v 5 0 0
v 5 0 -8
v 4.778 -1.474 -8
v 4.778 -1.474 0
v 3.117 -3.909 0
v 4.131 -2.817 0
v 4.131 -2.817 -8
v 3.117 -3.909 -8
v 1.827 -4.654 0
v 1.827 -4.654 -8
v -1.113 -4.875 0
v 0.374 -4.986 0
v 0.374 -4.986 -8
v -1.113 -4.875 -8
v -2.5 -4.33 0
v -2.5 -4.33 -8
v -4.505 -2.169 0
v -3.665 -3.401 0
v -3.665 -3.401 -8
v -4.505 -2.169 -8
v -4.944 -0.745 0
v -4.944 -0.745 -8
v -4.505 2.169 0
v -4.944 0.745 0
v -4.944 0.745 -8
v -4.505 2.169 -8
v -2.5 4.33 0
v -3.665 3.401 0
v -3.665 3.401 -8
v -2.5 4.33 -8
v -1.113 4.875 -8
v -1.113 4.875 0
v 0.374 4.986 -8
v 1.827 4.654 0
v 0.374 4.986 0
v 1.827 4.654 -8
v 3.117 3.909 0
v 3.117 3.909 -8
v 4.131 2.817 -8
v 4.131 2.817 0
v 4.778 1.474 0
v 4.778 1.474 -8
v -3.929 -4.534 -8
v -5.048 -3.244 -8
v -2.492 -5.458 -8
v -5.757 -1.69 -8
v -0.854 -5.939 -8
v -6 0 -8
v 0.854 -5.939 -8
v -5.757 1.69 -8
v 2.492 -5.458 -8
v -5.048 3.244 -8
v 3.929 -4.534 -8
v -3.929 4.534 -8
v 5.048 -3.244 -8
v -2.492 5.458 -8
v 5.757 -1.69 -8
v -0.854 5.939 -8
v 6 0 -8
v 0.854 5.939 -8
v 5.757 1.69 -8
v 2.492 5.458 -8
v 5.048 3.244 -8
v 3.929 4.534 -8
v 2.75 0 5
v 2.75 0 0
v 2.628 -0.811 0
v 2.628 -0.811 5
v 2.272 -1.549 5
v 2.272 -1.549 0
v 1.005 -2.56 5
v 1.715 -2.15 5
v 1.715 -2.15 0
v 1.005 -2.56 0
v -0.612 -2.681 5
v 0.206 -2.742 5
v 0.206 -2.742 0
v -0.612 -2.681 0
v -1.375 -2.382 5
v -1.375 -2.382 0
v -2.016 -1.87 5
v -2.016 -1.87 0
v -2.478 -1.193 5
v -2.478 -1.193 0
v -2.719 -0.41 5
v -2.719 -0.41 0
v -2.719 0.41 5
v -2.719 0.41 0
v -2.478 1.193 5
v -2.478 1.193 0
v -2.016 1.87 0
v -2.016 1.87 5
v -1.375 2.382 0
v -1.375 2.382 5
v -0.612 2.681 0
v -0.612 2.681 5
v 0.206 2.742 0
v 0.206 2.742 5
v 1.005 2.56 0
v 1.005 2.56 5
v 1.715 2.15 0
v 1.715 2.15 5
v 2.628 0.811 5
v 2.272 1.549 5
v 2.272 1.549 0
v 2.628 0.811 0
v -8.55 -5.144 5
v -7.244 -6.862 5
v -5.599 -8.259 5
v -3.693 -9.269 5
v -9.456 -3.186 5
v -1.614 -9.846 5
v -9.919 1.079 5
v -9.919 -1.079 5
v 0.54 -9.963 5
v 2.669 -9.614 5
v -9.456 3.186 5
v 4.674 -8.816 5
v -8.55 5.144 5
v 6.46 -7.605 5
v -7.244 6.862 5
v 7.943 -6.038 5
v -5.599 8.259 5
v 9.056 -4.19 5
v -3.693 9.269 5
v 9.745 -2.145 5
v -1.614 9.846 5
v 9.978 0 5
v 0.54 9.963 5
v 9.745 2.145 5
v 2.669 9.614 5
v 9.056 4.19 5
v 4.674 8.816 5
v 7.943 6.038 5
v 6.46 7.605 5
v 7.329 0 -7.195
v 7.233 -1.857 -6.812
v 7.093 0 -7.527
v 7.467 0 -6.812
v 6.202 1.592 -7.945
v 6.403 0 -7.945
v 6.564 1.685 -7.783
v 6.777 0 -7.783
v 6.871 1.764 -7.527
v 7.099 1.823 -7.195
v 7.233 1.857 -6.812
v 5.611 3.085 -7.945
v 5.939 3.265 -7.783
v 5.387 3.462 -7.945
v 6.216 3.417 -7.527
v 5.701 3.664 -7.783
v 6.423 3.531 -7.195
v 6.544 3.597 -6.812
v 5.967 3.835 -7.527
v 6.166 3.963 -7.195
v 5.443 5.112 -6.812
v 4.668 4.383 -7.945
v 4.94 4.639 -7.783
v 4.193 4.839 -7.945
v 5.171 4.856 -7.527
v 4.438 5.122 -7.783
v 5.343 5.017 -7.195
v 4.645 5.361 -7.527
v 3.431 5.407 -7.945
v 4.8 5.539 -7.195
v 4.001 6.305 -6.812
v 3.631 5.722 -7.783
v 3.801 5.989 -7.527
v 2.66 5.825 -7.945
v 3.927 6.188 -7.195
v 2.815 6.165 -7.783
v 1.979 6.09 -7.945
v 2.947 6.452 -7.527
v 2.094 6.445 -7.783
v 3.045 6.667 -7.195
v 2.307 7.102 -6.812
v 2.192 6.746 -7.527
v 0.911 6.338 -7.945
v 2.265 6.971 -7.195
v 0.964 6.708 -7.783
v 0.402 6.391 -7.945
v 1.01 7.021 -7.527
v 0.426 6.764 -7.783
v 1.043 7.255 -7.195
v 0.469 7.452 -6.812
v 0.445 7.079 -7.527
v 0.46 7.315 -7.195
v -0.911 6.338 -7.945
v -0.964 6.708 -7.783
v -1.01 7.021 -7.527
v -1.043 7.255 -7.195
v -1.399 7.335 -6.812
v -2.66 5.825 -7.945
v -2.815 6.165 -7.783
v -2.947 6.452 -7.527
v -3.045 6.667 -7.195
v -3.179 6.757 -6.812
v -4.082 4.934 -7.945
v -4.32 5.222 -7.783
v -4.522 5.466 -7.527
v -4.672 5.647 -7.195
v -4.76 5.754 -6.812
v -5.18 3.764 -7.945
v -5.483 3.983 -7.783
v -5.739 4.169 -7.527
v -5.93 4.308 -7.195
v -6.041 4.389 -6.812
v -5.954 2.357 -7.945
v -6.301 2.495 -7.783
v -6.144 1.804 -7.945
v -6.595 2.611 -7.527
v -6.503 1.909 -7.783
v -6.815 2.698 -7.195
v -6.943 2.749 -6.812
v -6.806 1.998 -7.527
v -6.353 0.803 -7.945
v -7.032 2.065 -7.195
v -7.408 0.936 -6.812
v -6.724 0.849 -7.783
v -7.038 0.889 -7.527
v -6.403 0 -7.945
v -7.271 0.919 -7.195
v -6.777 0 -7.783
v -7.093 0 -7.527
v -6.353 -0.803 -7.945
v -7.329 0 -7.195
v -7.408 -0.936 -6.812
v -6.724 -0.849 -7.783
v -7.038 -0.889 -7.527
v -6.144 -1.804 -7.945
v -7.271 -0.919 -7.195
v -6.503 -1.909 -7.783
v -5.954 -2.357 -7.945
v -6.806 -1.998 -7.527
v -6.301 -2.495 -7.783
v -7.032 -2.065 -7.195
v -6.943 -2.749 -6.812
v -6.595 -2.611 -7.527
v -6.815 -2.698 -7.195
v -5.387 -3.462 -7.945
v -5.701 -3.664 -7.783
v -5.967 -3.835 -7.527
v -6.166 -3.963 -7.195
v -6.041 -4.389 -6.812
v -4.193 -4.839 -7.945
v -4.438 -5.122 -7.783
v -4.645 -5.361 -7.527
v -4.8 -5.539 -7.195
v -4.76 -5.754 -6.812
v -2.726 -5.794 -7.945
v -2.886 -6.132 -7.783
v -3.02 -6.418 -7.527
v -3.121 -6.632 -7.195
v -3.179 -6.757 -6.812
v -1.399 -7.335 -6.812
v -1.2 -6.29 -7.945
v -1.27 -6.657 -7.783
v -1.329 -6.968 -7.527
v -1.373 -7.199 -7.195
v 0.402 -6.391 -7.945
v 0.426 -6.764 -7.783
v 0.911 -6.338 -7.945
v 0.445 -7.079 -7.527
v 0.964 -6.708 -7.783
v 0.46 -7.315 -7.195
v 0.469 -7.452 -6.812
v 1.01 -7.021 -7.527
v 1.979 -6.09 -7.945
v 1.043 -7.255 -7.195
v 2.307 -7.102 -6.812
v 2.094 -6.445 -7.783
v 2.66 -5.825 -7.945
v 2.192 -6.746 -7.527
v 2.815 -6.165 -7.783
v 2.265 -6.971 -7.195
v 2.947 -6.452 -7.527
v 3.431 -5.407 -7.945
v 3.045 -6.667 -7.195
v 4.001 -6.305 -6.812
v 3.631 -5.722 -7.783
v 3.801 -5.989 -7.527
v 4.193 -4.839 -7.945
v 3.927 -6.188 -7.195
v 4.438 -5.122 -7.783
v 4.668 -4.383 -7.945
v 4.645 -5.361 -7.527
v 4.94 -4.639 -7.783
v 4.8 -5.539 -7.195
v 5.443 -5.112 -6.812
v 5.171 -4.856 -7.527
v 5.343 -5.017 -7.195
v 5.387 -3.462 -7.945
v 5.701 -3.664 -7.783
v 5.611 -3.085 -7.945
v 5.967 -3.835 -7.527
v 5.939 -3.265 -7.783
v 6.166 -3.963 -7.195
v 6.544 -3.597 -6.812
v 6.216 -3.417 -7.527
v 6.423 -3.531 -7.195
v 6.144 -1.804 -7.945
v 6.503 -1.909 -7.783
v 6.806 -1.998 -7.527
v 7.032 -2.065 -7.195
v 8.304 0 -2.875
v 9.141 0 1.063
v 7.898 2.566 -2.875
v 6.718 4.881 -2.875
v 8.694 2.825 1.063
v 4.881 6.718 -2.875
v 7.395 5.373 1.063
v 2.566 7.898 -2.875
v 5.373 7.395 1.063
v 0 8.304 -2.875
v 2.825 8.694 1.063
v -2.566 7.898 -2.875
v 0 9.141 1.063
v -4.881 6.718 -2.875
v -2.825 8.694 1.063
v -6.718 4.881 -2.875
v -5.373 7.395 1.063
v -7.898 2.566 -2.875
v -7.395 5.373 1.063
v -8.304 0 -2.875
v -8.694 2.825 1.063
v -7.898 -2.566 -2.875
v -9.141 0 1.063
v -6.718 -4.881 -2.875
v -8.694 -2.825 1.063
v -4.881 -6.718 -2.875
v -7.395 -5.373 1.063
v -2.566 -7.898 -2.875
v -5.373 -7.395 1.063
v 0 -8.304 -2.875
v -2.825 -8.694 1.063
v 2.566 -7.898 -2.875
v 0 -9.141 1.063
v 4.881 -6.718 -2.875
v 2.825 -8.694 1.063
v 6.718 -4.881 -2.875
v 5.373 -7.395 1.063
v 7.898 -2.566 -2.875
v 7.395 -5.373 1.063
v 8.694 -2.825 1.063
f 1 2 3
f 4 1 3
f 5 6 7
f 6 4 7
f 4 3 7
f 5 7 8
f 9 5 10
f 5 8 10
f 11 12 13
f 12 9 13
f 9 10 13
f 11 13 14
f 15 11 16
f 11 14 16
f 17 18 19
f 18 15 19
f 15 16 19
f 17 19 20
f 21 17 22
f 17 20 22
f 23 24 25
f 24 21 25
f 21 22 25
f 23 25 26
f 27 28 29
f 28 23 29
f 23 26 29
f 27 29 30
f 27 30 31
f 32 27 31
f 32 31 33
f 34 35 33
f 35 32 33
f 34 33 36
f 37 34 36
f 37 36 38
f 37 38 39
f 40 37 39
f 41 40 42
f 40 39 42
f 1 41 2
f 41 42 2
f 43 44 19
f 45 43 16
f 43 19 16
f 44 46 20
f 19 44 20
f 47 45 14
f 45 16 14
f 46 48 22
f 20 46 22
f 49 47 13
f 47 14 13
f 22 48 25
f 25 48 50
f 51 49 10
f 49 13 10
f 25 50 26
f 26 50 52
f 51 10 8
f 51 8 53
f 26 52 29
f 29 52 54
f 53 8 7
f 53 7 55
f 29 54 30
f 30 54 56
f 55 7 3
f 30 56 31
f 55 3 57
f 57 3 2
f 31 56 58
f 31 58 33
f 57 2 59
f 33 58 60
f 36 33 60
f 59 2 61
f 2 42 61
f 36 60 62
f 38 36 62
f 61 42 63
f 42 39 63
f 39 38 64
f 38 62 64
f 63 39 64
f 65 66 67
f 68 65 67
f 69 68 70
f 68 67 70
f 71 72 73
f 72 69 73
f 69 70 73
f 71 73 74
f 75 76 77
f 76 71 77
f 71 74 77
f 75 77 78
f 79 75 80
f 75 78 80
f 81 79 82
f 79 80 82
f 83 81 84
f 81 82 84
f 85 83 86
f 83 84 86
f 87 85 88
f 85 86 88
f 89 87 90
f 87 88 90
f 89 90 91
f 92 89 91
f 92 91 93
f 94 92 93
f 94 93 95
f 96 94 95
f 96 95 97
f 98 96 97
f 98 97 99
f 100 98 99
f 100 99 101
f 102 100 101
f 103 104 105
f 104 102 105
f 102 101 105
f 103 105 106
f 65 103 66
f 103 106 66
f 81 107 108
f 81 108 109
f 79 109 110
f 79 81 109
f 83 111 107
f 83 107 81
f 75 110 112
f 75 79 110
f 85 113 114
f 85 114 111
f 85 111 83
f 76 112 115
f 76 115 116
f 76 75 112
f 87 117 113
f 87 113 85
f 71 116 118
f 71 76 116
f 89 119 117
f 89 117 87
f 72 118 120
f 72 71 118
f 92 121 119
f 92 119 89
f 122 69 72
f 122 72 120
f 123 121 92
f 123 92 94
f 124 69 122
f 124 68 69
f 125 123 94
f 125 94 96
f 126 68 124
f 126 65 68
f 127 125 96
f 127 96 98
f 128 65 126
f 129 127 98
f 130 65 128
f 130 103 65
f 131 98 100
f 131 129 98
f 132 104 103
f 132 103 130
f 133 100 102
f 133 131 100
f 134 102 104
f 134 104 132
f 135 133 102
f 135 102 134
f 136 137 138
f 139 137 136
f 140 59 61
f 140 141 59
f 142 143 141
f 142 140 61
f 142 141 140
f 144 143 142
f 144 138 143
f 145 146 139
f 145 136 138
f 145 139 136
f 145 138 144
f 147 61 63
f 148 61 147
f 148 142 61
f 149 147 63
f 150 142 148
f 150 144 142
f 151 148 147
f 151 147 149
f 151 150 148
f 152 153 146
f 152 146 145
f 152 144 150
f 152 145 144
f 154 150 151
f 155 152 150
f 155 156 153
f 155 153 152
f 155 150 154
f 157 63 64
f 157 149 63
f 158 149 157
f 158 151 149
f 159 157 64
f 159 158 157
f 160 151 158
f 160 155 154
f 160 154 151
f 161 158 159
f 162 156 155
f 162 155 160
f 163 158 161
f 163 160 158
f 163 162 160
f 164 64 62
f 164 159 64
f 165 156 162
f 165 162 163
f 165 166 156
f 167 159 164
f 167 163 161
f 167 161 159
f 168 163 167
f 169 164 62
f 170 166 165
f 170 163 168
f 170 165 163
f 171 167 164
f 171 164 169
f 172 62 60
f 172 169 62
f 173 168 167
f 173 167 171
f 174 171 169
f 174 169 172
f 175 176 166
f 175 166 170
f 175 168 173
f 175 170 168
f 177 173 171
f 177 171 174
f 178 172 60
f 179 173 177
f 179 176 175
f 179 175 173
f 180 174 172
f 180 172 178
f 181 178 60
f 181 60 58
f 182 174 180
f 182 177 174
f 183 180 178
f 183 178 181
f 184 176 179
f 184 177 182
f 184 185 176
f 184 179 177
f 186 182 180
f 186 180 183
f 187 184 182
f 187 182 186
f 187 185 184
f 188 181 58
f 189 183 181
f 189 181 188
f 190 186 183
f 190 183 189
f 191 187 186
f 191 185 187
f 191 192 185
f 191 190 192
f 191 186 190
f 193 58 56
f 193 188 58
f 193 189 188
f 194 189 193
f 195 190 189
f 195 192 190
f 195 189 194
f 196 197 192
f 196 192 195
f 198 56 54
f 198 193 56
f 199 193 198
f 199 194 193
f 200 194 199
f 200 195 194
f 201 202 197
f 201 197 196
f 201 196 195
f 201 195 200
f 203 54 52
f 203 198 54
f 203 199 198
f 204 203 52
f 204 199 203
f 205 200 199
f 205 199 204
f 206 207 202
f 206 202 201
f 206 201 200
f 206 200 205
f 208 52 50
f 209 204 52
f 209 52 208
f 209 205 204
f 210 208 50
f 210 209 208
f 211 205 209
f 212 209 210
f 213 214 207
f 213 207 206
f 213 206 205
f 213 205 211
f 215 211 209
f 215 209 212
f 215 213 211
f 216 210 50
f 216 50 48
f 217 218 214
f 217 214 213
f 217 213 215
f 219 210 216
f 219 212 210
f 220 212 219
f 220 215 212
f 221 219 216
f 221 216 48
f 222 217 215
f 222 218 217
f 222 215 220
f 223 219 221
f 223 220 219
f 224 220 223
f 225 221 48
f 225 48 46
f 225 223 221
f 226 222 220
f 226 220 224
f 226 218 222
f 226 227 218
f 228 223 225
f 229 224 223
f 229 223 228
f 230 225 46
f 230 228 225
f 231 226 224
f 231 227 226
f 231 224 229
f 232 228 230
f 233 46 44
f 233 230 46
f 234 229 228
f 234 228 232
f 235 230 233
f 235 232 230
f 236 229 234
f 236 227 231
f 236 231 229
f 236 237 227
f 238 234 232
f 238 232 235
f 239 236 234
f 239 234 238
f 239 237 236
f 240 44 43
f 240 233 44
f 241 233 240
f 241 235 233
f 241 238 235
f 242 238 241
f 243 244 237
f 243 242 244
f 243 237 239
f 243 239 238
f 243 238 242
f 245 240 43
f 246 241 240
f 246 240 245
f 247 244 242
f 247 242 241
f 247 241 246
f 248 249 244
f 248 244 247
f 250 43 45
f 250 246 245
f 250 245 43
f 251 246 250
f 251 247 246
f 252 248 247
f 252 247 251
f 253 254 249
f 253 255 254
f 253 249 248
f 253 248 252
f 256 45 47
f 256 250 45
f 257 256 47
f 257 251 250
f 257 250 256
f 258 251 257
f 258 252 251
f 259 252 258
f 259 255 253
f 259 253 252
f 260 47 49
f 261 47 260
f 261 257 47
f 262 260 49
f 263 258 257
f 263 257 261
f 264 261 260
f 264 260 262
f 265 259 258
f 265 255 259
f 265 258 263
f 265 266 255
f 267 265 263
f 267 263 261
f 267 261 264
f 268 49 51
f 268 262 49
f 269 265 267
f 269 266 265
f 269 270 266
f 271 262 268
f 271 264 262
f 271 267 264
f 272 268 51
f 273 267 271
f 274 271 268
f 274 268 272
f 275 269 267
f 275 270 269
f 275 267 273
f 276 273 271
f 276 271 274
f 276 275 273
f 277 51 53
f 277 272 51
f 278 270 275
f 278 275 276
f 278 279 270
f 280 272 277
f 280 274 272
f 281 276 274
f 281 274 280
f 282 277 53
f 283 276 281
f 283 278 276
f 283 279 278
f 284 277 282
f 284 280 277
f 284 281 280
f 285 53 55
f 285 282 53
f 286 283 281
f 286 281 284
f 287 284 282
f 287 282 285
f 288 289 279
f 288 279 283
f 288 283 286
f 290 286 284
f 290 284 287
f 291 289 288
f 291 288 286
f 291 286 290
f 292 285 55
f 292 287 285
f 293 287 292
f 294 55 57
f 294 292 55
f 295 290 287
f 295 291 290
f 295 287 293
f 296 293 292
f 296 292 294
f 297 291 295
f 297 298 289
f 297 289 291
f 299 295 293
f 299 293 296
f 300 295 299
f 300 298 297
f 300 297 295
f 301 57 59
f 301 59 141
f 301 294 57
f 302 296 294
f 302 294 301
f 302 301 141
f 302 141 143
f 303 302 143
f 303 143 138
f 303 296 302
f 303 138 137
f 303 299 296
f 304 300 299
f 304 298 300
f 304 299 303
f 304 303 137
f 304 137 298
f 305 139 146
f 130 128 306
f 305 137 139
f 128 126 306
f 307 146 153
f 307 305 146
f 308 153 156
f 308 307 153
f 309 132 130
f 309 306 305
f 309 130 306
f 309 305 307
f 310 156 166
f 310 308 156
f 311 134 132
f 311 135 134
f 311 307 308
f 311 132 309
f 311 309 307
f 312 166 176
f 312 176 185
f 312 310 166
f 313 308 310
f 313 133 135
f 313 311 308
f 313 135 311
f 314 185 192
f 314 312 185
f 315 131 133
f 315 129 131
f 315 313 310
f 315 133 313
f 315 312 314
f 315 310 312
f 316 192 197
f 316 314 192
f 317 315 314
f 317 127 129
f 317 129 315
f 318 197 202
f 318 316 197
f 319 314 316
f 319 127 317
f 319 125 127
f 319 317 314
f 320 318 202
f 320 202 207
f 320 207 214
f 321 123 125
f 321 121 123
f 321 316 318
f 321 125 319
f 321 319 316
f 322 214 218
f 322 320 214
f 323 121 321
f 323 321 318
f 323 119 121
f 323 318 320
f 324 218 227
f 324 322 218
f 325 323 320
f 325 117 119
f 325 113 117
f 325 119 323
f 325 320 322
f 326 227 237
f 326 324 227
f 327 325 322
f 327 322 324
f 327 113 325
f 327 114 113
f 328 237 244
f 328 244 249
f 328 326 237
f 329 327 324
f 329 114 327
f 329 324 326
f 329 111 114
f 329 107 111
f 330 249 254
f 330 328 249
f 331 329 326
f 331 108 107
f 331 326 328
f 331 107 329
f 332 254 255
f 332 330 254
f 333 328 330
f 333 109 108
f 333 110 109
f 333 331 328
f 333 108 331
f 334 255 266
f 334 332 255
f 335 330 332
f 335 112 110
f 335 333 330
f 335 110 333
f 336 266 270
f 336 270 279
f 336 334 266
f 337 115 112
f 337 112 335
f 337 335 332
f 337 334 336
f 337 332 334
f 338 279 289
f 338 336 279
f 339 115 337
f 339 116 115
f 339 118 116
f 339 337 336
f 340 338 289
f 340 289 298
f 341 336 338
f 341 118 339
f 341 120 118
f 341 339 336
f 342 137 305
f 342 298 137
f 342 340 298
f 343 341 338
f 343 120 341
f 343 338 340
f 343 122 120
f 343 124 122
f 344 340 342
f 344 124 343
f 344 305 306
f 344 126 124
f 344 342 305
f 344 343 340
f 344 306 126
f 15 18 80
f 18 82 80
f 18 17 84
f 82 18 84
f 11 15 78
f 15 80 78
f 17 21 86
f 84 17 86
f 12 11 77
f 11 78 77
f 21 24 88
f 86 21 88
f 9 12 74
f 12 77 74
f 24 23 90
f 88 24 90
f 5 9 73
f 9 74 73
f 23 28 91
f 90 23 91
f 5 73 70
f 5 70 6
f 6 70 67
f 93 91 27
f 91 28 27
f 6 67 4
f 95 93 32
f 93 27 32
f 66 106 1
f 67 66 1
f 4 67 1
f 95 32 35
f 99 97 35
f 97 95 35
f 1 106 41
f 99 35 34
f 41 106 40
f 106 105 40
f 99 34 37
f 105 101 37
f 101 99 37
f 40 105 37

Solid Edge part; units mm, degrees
sketch "Sketch1" plane through (0, 0, 0) normal (0, -1, 0) x (1, 0, 0)
  line L0 (2.75, 5) -> (2.75, 0)
  line L1 (2.75, 0) -> (5, 0)
  line L2 (5, 0) -> (5, -8)
  line L3 (5, -8) -> (6, -8)
  arc A0 (6, -8) -> (7.4672, -6.8119) centre (6, -6.5) ccw
  line L4 (7.4672, -6.8119) -> (9.9779, 5)
  line L5 (9.9779, 5) -> (2.75, 5)
  dimension "D1" = 5
  dimension "D2" = 8
  dimension "D3" = 1.5
  dimension "D4" = 1
revolve "RevolvedProtrusion1" add sketch "Sketch1" angle 360 about axis through (0, 0, 0) along (0, 0, 1)
properties material "Bronze, 90%"
